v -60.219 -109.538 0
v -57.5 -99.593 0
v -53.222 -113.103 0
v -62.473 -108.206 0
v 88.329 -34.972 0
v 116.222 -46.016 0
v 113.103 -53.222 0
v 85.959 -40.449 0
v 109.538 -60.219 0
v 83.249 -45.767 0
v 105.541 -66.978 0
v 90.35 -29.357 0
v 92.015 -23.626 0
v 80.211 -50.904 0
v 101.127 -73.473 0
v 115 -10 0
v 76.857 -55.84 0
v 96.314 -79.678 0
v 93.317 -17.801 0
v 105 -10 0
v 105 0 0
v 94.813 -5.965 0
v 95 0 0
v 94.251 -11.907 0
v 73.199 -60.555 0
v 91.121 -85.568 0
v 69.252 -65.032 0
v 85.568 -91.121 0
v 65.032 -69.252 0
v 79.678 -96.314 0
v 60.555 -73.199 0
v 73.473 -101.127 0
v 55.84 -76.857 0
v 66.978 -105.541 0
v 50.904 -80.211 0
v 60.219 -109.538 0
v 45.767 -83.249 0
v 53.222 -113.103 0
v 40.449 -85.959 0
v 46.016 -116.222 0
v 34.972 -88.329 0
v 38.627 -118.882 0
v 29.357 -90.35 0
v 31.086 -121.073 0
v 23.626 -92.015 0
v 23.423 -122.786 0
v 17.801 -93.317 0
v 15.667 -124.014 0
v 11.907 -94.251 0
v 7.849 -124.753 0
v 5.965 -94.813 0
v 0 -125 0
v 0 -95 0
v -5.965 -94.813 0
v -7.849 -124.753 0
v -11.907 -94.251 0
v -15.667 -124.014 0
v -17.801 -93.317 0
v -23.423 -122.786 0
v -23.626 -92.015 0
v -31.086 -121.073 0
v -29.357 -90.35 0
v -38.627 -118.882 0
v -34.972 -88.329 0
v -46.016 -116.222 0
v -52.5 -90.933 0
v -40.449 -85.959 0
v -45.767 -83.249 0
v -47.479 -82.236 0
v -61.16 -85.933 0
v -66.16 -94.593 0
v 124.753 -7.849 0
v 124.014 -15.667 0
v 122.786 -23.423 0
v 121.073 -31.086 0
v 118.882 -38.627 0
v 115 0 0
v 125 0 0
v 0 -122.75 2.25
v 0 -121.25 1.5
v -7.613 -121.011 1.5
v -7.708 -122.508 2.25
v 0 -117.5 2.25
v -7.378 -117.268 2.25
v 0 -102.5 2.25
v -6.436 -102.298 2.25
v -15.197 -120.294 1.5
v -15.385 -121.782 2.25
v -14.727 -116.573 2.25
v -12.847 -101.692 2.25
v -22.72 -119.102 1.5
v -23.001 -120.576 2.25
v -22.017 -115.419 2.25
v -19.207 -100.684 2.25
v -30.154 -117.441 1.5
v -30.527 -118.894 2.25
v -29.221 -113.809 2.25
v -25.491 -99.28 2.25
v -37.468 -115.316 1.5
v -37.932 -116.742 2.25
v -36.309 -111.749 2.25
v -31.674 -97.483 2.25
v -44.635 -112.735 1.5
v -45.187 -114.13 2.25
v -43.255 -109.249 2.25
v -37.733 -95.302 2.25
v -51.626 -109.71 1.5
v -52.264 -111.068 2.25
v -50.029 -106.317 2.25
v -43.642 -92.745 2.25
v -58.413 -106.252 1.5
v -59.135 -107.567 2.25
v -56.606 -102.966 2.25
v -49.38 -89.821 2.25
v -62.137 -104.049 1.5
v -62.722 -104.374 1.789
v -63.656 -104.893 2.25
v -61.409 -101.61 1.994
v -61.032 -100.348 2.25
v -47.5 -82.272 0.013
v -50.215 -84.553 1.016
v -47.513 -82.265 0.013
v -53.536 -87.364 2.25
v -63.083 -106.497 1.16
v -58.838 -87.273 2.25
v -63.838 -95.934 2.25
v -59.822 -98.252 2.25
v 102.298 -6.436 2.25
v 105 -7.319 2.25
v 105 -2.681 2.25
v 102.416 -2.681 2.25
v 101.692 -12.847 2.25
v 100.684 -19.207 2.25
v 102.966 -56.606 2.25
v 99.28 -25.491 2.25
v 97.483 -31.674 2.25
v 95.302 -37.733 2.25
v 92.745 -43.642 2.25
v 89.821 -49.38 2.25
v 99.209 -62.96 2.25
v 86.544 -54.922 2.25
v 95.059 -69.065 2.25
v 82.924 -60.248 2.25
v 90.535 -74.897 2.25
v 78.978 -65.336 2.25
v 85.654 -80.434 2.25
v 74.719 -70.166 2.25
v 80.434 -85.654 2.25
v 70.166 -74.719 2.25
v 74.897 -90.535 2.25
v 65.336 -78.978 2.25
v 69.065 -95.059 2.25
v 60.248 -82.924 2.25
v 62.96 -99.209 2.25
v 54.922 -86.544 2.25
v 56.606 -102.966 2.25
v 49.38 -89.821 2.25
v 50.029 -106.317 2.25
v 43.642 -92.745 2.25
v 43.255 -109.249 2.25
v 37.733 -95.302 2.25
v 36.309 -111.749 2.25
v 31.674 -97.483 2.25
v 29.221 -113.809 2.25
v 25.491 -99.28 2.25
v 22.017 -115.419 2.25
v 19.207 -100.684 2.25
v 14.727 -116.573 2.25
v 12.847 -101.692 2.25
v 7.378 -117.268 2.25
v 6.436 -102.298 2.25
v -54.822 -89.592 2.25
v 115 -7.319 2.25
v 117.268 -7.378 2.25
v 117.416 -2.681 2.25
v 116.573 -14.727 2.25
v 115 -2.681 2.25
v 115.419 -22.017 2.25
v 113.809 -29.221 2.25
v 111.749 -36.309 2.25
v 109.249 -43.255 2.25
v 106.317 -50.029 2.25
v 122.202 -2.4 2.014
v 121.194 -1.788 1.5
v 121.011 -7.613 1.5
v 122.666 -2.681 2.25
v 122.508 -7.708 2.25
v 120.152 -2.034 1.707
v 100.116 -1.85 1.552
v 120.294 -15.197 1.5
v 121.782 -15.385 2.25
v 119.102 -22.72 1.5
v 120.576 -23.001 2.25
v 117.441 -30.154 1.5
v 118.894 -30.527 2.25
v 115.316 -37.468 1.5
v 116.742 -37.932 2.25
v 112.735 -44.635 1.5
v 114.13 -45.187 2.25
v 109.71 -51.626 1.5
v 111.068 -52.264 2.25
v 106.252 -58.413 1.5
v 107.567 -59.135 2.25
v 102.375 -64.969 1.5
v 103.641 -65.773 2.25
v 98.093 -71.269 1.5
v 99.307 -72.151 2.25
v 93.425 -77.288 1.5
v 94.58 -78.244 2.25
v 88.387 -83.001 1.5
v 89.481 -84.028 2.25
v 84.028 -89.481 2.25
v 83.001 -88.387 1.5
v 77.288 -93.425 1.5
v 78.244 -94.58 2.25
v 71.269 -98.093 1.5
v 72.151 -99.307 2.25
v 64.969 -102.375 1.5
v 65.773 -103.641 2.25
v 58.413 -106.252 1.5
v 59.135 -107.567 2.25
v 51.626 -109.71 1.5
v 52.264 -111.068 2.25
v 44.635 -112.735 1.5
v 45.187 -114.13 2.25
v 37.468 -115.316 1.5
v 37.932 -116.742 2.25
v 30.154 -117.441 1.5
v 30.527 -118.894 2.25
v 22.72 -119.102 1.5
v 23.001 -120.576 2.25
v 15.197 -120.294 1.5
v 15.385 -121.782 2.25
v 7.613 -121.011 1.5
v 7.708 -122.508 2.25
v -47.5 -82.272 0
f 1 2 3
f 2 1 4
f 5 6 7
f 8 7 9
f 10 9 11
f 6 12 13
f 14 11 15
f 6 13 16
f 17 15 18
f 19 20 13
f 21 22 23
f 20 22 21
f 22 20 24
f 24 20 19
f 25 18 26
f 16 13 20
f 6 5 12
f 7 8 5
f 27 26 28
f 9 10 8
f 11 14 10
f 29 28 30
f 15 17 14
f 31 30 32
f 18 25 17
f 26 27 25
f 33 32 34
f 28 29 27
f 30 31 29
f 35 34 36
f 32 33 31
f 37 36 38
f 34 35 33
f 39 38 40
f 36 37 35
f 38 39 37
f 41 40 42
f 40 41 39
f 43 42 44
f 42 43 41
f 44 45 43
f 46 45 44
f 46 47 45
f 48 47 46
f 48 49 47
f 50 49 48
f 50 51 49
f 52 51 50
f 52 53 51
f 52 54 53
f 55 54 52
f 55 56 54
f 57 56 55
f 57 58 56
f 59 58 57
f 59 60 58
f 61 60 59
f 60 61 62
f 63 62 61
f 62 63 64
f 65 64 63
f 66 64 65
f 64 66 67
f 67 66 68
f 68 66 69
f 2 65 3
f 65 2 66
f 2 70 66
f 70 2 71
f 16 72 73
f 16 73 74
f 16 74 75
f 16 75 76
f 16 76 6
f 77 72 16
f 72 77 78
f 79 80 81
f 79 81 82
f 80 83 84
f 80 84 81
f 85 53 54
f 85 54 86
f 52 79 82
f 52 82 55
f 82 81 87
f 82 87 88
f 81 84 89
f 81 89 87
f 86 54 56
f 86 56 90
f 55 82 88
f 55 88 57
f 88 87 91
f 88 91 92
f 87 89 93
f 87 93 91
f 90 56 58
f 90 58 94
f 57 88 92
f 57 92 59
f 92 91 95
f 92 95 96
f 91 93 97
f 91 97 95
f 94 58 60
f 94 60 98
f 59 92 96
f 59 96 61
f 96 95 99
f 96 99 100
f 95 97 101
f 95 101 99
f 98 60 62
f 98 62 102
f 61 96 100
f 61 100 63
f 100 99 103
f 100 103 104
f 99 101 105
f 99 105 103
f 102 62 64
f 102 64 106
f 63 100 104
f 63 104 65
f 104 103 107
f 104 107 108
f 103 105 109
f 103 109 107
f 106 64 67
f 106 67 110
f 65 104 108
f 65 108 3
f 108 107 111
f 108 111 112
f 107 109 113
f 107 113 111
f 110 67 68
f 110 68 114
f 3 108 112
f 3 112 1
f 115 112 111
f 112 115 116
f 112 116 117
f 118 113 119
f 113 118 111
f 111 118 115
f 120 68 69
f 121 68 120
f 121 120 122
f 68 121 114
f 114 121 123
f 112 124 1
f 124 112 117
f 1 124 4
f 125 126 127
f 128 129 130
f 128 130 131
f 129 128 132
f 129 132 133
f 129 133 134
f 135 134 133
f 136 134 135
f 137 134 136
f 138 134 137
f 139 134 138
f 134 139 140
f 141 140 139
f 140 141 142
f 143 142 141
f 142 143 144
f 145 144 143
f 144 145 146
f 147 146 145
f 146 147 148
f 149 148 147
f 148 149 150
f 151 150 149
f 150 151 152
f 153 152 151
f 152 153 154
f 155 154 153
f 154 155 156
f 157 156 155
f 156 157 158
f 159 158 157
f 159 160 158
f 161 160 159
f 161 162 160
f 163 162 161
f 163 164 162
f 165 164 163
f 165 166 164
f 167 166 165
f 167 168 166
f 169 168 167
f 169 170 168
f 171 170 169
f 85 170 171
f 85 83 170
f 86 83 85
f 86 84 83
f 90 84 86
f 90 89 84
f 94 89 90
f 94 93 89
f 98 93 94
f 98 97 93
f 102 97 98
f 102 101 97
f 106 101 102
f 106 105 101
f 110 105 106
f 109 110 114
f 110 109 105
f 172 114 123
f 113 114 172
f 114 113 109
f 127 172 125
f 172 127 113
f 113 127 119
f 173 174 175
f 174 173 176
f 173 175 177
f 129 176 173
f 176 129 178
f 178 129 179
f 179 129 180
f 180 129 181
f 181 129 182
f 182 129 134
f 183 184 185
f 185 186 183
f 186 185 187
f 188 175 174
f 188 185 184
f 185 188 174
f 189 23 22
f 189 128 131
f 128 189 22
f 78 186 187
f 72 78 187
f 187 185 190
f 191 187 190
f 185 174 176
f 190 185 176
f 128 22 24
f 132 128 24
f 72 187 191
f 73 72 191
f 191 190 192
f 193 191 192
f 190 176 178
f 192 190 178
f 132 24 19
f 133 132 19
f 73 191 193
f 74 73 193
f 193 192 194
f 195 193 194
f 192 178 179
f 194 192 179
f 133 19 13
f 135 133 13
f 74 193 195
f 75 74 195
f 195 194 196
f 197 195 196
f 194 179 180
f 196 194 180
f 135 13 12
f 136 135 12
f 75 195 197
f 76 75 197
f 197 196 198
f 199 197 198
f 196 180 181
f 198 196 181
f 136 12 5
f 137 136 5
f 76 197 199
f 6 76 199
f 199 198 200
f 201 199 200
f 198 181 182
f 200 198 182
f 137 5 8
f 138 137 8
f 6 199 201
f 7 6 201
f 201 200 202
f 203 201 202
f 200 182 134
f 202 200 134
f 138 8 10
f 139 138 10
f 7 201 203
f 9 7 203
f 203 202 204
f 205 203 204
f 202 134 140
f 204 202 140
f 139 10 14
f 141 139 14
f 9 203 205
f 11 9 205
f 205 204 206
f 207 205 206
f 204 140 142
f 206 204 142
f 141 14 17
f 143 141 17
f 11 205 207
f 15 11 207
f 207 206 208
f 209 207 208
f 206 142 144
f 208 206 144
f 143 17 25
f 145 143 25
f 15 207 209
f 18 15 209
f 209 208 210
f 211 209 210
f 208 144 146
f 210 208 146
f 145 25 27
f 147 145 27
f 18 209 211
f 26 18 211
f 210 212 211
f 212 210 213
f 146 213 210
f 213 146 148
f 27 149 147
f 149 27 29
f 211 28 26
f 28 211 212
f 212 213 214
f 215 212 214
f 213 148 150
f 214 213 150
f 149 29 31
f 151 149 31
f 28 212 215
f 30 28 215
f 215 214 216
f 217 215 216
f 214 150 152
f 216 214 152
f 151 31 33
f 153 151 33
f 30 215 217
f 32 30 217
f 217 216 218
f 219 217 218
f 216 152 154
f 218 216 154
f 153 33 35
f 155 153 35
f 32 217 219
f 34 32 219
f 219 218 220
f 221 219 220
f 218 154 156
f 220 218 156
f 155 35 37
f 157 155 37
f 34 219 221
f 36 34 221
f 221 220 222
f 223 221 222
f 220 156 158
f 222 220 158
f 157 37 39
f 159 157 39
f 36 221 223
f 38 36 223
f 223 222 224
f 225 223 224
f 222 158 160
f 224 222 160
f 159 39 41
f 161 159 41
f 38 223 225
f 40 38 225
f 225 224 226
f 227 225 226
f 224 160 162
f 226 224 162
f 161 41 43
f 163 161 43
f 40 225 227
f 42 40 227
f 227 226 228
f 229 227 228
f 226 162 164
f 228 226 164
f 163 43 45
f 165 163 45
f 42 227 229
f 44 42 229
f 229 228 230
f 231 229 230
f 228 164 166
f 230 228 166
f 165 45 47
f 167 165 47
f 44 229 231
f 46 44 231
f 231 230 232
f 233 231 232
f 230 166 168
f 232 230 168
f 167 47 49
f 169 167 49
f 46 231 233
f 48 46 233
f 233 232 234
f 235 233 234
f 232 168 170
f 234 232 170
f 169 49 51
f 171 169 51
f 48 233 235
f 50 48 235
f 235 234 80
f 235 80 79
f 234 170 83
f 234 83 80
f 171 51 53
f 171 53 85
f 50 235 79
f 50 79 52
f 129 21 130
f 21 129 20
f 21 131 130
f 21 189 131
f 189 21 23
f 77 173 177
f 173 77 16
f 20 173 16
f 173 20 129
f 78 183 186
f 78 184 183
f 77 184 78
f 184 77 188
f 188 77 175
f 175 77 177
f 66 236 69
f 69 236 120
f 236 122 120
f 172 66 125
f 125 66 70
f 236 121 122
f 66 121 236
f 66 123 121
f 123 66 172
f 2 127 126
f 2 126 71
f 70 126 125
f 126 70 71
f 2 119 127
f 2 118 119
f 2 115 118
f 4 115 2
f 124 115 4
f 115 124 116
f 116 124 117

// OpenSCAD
// Radius of the ring (half of the print bad size)
size = 125; // [50:400]

// Size of the rounded corner, higher is more rouned.You get a circle if = [size], you get a square with rounded corners if = [ring_width]
corner_size = 125; // [10:400]

// Width of the ring
ring_width = 30; // [10:100]

/* [Hidden] */

$fn=100;

tooth_size = 10;

q_ring();

module q_ring() {
difference(){
    half_ring();
    rotate([0,0,-90-120]) cube([corner_size, corner_size, 20]);
}

intersection(){
    half_ring();
    rotate([0,0,-120]) interface();
}
}
module half_ring() {
    difference(){
    for (i = [2:3]){
        rotate([0,0,90*i])
        arm();
    }
    interface();
    }
}

module interface() {
    for (i = [size-ring_width:tooth_size*2:size]){
    translate([i, 0, 0]) rotate([50,0,0]) cube([tooth_size, tooth_size, 20]);
    translate([i+tooth_size, -10, 0]) rotate([-50,0,0]) cube([tooth_size, tooth_size, 20]);    
    }
}

module arm() {
    translate([size,size-corner_size,0])
    rotate([90,0,0])
    linear_extrude((size - corner_size)*2) profile();

    translate([size-corner_size,size-corner_size,0])
    intersection(){
        cube(corner_size);
        rotate_extrude()
        translate([corner_size,0,0]) profile();
    }
}


module profile() {
    scale(ring_width/40)
    translate([-40,0,0])
    polygon([[0,0],[40,0],[37,3],[35,2],[30,3],[10,3]]);
}
